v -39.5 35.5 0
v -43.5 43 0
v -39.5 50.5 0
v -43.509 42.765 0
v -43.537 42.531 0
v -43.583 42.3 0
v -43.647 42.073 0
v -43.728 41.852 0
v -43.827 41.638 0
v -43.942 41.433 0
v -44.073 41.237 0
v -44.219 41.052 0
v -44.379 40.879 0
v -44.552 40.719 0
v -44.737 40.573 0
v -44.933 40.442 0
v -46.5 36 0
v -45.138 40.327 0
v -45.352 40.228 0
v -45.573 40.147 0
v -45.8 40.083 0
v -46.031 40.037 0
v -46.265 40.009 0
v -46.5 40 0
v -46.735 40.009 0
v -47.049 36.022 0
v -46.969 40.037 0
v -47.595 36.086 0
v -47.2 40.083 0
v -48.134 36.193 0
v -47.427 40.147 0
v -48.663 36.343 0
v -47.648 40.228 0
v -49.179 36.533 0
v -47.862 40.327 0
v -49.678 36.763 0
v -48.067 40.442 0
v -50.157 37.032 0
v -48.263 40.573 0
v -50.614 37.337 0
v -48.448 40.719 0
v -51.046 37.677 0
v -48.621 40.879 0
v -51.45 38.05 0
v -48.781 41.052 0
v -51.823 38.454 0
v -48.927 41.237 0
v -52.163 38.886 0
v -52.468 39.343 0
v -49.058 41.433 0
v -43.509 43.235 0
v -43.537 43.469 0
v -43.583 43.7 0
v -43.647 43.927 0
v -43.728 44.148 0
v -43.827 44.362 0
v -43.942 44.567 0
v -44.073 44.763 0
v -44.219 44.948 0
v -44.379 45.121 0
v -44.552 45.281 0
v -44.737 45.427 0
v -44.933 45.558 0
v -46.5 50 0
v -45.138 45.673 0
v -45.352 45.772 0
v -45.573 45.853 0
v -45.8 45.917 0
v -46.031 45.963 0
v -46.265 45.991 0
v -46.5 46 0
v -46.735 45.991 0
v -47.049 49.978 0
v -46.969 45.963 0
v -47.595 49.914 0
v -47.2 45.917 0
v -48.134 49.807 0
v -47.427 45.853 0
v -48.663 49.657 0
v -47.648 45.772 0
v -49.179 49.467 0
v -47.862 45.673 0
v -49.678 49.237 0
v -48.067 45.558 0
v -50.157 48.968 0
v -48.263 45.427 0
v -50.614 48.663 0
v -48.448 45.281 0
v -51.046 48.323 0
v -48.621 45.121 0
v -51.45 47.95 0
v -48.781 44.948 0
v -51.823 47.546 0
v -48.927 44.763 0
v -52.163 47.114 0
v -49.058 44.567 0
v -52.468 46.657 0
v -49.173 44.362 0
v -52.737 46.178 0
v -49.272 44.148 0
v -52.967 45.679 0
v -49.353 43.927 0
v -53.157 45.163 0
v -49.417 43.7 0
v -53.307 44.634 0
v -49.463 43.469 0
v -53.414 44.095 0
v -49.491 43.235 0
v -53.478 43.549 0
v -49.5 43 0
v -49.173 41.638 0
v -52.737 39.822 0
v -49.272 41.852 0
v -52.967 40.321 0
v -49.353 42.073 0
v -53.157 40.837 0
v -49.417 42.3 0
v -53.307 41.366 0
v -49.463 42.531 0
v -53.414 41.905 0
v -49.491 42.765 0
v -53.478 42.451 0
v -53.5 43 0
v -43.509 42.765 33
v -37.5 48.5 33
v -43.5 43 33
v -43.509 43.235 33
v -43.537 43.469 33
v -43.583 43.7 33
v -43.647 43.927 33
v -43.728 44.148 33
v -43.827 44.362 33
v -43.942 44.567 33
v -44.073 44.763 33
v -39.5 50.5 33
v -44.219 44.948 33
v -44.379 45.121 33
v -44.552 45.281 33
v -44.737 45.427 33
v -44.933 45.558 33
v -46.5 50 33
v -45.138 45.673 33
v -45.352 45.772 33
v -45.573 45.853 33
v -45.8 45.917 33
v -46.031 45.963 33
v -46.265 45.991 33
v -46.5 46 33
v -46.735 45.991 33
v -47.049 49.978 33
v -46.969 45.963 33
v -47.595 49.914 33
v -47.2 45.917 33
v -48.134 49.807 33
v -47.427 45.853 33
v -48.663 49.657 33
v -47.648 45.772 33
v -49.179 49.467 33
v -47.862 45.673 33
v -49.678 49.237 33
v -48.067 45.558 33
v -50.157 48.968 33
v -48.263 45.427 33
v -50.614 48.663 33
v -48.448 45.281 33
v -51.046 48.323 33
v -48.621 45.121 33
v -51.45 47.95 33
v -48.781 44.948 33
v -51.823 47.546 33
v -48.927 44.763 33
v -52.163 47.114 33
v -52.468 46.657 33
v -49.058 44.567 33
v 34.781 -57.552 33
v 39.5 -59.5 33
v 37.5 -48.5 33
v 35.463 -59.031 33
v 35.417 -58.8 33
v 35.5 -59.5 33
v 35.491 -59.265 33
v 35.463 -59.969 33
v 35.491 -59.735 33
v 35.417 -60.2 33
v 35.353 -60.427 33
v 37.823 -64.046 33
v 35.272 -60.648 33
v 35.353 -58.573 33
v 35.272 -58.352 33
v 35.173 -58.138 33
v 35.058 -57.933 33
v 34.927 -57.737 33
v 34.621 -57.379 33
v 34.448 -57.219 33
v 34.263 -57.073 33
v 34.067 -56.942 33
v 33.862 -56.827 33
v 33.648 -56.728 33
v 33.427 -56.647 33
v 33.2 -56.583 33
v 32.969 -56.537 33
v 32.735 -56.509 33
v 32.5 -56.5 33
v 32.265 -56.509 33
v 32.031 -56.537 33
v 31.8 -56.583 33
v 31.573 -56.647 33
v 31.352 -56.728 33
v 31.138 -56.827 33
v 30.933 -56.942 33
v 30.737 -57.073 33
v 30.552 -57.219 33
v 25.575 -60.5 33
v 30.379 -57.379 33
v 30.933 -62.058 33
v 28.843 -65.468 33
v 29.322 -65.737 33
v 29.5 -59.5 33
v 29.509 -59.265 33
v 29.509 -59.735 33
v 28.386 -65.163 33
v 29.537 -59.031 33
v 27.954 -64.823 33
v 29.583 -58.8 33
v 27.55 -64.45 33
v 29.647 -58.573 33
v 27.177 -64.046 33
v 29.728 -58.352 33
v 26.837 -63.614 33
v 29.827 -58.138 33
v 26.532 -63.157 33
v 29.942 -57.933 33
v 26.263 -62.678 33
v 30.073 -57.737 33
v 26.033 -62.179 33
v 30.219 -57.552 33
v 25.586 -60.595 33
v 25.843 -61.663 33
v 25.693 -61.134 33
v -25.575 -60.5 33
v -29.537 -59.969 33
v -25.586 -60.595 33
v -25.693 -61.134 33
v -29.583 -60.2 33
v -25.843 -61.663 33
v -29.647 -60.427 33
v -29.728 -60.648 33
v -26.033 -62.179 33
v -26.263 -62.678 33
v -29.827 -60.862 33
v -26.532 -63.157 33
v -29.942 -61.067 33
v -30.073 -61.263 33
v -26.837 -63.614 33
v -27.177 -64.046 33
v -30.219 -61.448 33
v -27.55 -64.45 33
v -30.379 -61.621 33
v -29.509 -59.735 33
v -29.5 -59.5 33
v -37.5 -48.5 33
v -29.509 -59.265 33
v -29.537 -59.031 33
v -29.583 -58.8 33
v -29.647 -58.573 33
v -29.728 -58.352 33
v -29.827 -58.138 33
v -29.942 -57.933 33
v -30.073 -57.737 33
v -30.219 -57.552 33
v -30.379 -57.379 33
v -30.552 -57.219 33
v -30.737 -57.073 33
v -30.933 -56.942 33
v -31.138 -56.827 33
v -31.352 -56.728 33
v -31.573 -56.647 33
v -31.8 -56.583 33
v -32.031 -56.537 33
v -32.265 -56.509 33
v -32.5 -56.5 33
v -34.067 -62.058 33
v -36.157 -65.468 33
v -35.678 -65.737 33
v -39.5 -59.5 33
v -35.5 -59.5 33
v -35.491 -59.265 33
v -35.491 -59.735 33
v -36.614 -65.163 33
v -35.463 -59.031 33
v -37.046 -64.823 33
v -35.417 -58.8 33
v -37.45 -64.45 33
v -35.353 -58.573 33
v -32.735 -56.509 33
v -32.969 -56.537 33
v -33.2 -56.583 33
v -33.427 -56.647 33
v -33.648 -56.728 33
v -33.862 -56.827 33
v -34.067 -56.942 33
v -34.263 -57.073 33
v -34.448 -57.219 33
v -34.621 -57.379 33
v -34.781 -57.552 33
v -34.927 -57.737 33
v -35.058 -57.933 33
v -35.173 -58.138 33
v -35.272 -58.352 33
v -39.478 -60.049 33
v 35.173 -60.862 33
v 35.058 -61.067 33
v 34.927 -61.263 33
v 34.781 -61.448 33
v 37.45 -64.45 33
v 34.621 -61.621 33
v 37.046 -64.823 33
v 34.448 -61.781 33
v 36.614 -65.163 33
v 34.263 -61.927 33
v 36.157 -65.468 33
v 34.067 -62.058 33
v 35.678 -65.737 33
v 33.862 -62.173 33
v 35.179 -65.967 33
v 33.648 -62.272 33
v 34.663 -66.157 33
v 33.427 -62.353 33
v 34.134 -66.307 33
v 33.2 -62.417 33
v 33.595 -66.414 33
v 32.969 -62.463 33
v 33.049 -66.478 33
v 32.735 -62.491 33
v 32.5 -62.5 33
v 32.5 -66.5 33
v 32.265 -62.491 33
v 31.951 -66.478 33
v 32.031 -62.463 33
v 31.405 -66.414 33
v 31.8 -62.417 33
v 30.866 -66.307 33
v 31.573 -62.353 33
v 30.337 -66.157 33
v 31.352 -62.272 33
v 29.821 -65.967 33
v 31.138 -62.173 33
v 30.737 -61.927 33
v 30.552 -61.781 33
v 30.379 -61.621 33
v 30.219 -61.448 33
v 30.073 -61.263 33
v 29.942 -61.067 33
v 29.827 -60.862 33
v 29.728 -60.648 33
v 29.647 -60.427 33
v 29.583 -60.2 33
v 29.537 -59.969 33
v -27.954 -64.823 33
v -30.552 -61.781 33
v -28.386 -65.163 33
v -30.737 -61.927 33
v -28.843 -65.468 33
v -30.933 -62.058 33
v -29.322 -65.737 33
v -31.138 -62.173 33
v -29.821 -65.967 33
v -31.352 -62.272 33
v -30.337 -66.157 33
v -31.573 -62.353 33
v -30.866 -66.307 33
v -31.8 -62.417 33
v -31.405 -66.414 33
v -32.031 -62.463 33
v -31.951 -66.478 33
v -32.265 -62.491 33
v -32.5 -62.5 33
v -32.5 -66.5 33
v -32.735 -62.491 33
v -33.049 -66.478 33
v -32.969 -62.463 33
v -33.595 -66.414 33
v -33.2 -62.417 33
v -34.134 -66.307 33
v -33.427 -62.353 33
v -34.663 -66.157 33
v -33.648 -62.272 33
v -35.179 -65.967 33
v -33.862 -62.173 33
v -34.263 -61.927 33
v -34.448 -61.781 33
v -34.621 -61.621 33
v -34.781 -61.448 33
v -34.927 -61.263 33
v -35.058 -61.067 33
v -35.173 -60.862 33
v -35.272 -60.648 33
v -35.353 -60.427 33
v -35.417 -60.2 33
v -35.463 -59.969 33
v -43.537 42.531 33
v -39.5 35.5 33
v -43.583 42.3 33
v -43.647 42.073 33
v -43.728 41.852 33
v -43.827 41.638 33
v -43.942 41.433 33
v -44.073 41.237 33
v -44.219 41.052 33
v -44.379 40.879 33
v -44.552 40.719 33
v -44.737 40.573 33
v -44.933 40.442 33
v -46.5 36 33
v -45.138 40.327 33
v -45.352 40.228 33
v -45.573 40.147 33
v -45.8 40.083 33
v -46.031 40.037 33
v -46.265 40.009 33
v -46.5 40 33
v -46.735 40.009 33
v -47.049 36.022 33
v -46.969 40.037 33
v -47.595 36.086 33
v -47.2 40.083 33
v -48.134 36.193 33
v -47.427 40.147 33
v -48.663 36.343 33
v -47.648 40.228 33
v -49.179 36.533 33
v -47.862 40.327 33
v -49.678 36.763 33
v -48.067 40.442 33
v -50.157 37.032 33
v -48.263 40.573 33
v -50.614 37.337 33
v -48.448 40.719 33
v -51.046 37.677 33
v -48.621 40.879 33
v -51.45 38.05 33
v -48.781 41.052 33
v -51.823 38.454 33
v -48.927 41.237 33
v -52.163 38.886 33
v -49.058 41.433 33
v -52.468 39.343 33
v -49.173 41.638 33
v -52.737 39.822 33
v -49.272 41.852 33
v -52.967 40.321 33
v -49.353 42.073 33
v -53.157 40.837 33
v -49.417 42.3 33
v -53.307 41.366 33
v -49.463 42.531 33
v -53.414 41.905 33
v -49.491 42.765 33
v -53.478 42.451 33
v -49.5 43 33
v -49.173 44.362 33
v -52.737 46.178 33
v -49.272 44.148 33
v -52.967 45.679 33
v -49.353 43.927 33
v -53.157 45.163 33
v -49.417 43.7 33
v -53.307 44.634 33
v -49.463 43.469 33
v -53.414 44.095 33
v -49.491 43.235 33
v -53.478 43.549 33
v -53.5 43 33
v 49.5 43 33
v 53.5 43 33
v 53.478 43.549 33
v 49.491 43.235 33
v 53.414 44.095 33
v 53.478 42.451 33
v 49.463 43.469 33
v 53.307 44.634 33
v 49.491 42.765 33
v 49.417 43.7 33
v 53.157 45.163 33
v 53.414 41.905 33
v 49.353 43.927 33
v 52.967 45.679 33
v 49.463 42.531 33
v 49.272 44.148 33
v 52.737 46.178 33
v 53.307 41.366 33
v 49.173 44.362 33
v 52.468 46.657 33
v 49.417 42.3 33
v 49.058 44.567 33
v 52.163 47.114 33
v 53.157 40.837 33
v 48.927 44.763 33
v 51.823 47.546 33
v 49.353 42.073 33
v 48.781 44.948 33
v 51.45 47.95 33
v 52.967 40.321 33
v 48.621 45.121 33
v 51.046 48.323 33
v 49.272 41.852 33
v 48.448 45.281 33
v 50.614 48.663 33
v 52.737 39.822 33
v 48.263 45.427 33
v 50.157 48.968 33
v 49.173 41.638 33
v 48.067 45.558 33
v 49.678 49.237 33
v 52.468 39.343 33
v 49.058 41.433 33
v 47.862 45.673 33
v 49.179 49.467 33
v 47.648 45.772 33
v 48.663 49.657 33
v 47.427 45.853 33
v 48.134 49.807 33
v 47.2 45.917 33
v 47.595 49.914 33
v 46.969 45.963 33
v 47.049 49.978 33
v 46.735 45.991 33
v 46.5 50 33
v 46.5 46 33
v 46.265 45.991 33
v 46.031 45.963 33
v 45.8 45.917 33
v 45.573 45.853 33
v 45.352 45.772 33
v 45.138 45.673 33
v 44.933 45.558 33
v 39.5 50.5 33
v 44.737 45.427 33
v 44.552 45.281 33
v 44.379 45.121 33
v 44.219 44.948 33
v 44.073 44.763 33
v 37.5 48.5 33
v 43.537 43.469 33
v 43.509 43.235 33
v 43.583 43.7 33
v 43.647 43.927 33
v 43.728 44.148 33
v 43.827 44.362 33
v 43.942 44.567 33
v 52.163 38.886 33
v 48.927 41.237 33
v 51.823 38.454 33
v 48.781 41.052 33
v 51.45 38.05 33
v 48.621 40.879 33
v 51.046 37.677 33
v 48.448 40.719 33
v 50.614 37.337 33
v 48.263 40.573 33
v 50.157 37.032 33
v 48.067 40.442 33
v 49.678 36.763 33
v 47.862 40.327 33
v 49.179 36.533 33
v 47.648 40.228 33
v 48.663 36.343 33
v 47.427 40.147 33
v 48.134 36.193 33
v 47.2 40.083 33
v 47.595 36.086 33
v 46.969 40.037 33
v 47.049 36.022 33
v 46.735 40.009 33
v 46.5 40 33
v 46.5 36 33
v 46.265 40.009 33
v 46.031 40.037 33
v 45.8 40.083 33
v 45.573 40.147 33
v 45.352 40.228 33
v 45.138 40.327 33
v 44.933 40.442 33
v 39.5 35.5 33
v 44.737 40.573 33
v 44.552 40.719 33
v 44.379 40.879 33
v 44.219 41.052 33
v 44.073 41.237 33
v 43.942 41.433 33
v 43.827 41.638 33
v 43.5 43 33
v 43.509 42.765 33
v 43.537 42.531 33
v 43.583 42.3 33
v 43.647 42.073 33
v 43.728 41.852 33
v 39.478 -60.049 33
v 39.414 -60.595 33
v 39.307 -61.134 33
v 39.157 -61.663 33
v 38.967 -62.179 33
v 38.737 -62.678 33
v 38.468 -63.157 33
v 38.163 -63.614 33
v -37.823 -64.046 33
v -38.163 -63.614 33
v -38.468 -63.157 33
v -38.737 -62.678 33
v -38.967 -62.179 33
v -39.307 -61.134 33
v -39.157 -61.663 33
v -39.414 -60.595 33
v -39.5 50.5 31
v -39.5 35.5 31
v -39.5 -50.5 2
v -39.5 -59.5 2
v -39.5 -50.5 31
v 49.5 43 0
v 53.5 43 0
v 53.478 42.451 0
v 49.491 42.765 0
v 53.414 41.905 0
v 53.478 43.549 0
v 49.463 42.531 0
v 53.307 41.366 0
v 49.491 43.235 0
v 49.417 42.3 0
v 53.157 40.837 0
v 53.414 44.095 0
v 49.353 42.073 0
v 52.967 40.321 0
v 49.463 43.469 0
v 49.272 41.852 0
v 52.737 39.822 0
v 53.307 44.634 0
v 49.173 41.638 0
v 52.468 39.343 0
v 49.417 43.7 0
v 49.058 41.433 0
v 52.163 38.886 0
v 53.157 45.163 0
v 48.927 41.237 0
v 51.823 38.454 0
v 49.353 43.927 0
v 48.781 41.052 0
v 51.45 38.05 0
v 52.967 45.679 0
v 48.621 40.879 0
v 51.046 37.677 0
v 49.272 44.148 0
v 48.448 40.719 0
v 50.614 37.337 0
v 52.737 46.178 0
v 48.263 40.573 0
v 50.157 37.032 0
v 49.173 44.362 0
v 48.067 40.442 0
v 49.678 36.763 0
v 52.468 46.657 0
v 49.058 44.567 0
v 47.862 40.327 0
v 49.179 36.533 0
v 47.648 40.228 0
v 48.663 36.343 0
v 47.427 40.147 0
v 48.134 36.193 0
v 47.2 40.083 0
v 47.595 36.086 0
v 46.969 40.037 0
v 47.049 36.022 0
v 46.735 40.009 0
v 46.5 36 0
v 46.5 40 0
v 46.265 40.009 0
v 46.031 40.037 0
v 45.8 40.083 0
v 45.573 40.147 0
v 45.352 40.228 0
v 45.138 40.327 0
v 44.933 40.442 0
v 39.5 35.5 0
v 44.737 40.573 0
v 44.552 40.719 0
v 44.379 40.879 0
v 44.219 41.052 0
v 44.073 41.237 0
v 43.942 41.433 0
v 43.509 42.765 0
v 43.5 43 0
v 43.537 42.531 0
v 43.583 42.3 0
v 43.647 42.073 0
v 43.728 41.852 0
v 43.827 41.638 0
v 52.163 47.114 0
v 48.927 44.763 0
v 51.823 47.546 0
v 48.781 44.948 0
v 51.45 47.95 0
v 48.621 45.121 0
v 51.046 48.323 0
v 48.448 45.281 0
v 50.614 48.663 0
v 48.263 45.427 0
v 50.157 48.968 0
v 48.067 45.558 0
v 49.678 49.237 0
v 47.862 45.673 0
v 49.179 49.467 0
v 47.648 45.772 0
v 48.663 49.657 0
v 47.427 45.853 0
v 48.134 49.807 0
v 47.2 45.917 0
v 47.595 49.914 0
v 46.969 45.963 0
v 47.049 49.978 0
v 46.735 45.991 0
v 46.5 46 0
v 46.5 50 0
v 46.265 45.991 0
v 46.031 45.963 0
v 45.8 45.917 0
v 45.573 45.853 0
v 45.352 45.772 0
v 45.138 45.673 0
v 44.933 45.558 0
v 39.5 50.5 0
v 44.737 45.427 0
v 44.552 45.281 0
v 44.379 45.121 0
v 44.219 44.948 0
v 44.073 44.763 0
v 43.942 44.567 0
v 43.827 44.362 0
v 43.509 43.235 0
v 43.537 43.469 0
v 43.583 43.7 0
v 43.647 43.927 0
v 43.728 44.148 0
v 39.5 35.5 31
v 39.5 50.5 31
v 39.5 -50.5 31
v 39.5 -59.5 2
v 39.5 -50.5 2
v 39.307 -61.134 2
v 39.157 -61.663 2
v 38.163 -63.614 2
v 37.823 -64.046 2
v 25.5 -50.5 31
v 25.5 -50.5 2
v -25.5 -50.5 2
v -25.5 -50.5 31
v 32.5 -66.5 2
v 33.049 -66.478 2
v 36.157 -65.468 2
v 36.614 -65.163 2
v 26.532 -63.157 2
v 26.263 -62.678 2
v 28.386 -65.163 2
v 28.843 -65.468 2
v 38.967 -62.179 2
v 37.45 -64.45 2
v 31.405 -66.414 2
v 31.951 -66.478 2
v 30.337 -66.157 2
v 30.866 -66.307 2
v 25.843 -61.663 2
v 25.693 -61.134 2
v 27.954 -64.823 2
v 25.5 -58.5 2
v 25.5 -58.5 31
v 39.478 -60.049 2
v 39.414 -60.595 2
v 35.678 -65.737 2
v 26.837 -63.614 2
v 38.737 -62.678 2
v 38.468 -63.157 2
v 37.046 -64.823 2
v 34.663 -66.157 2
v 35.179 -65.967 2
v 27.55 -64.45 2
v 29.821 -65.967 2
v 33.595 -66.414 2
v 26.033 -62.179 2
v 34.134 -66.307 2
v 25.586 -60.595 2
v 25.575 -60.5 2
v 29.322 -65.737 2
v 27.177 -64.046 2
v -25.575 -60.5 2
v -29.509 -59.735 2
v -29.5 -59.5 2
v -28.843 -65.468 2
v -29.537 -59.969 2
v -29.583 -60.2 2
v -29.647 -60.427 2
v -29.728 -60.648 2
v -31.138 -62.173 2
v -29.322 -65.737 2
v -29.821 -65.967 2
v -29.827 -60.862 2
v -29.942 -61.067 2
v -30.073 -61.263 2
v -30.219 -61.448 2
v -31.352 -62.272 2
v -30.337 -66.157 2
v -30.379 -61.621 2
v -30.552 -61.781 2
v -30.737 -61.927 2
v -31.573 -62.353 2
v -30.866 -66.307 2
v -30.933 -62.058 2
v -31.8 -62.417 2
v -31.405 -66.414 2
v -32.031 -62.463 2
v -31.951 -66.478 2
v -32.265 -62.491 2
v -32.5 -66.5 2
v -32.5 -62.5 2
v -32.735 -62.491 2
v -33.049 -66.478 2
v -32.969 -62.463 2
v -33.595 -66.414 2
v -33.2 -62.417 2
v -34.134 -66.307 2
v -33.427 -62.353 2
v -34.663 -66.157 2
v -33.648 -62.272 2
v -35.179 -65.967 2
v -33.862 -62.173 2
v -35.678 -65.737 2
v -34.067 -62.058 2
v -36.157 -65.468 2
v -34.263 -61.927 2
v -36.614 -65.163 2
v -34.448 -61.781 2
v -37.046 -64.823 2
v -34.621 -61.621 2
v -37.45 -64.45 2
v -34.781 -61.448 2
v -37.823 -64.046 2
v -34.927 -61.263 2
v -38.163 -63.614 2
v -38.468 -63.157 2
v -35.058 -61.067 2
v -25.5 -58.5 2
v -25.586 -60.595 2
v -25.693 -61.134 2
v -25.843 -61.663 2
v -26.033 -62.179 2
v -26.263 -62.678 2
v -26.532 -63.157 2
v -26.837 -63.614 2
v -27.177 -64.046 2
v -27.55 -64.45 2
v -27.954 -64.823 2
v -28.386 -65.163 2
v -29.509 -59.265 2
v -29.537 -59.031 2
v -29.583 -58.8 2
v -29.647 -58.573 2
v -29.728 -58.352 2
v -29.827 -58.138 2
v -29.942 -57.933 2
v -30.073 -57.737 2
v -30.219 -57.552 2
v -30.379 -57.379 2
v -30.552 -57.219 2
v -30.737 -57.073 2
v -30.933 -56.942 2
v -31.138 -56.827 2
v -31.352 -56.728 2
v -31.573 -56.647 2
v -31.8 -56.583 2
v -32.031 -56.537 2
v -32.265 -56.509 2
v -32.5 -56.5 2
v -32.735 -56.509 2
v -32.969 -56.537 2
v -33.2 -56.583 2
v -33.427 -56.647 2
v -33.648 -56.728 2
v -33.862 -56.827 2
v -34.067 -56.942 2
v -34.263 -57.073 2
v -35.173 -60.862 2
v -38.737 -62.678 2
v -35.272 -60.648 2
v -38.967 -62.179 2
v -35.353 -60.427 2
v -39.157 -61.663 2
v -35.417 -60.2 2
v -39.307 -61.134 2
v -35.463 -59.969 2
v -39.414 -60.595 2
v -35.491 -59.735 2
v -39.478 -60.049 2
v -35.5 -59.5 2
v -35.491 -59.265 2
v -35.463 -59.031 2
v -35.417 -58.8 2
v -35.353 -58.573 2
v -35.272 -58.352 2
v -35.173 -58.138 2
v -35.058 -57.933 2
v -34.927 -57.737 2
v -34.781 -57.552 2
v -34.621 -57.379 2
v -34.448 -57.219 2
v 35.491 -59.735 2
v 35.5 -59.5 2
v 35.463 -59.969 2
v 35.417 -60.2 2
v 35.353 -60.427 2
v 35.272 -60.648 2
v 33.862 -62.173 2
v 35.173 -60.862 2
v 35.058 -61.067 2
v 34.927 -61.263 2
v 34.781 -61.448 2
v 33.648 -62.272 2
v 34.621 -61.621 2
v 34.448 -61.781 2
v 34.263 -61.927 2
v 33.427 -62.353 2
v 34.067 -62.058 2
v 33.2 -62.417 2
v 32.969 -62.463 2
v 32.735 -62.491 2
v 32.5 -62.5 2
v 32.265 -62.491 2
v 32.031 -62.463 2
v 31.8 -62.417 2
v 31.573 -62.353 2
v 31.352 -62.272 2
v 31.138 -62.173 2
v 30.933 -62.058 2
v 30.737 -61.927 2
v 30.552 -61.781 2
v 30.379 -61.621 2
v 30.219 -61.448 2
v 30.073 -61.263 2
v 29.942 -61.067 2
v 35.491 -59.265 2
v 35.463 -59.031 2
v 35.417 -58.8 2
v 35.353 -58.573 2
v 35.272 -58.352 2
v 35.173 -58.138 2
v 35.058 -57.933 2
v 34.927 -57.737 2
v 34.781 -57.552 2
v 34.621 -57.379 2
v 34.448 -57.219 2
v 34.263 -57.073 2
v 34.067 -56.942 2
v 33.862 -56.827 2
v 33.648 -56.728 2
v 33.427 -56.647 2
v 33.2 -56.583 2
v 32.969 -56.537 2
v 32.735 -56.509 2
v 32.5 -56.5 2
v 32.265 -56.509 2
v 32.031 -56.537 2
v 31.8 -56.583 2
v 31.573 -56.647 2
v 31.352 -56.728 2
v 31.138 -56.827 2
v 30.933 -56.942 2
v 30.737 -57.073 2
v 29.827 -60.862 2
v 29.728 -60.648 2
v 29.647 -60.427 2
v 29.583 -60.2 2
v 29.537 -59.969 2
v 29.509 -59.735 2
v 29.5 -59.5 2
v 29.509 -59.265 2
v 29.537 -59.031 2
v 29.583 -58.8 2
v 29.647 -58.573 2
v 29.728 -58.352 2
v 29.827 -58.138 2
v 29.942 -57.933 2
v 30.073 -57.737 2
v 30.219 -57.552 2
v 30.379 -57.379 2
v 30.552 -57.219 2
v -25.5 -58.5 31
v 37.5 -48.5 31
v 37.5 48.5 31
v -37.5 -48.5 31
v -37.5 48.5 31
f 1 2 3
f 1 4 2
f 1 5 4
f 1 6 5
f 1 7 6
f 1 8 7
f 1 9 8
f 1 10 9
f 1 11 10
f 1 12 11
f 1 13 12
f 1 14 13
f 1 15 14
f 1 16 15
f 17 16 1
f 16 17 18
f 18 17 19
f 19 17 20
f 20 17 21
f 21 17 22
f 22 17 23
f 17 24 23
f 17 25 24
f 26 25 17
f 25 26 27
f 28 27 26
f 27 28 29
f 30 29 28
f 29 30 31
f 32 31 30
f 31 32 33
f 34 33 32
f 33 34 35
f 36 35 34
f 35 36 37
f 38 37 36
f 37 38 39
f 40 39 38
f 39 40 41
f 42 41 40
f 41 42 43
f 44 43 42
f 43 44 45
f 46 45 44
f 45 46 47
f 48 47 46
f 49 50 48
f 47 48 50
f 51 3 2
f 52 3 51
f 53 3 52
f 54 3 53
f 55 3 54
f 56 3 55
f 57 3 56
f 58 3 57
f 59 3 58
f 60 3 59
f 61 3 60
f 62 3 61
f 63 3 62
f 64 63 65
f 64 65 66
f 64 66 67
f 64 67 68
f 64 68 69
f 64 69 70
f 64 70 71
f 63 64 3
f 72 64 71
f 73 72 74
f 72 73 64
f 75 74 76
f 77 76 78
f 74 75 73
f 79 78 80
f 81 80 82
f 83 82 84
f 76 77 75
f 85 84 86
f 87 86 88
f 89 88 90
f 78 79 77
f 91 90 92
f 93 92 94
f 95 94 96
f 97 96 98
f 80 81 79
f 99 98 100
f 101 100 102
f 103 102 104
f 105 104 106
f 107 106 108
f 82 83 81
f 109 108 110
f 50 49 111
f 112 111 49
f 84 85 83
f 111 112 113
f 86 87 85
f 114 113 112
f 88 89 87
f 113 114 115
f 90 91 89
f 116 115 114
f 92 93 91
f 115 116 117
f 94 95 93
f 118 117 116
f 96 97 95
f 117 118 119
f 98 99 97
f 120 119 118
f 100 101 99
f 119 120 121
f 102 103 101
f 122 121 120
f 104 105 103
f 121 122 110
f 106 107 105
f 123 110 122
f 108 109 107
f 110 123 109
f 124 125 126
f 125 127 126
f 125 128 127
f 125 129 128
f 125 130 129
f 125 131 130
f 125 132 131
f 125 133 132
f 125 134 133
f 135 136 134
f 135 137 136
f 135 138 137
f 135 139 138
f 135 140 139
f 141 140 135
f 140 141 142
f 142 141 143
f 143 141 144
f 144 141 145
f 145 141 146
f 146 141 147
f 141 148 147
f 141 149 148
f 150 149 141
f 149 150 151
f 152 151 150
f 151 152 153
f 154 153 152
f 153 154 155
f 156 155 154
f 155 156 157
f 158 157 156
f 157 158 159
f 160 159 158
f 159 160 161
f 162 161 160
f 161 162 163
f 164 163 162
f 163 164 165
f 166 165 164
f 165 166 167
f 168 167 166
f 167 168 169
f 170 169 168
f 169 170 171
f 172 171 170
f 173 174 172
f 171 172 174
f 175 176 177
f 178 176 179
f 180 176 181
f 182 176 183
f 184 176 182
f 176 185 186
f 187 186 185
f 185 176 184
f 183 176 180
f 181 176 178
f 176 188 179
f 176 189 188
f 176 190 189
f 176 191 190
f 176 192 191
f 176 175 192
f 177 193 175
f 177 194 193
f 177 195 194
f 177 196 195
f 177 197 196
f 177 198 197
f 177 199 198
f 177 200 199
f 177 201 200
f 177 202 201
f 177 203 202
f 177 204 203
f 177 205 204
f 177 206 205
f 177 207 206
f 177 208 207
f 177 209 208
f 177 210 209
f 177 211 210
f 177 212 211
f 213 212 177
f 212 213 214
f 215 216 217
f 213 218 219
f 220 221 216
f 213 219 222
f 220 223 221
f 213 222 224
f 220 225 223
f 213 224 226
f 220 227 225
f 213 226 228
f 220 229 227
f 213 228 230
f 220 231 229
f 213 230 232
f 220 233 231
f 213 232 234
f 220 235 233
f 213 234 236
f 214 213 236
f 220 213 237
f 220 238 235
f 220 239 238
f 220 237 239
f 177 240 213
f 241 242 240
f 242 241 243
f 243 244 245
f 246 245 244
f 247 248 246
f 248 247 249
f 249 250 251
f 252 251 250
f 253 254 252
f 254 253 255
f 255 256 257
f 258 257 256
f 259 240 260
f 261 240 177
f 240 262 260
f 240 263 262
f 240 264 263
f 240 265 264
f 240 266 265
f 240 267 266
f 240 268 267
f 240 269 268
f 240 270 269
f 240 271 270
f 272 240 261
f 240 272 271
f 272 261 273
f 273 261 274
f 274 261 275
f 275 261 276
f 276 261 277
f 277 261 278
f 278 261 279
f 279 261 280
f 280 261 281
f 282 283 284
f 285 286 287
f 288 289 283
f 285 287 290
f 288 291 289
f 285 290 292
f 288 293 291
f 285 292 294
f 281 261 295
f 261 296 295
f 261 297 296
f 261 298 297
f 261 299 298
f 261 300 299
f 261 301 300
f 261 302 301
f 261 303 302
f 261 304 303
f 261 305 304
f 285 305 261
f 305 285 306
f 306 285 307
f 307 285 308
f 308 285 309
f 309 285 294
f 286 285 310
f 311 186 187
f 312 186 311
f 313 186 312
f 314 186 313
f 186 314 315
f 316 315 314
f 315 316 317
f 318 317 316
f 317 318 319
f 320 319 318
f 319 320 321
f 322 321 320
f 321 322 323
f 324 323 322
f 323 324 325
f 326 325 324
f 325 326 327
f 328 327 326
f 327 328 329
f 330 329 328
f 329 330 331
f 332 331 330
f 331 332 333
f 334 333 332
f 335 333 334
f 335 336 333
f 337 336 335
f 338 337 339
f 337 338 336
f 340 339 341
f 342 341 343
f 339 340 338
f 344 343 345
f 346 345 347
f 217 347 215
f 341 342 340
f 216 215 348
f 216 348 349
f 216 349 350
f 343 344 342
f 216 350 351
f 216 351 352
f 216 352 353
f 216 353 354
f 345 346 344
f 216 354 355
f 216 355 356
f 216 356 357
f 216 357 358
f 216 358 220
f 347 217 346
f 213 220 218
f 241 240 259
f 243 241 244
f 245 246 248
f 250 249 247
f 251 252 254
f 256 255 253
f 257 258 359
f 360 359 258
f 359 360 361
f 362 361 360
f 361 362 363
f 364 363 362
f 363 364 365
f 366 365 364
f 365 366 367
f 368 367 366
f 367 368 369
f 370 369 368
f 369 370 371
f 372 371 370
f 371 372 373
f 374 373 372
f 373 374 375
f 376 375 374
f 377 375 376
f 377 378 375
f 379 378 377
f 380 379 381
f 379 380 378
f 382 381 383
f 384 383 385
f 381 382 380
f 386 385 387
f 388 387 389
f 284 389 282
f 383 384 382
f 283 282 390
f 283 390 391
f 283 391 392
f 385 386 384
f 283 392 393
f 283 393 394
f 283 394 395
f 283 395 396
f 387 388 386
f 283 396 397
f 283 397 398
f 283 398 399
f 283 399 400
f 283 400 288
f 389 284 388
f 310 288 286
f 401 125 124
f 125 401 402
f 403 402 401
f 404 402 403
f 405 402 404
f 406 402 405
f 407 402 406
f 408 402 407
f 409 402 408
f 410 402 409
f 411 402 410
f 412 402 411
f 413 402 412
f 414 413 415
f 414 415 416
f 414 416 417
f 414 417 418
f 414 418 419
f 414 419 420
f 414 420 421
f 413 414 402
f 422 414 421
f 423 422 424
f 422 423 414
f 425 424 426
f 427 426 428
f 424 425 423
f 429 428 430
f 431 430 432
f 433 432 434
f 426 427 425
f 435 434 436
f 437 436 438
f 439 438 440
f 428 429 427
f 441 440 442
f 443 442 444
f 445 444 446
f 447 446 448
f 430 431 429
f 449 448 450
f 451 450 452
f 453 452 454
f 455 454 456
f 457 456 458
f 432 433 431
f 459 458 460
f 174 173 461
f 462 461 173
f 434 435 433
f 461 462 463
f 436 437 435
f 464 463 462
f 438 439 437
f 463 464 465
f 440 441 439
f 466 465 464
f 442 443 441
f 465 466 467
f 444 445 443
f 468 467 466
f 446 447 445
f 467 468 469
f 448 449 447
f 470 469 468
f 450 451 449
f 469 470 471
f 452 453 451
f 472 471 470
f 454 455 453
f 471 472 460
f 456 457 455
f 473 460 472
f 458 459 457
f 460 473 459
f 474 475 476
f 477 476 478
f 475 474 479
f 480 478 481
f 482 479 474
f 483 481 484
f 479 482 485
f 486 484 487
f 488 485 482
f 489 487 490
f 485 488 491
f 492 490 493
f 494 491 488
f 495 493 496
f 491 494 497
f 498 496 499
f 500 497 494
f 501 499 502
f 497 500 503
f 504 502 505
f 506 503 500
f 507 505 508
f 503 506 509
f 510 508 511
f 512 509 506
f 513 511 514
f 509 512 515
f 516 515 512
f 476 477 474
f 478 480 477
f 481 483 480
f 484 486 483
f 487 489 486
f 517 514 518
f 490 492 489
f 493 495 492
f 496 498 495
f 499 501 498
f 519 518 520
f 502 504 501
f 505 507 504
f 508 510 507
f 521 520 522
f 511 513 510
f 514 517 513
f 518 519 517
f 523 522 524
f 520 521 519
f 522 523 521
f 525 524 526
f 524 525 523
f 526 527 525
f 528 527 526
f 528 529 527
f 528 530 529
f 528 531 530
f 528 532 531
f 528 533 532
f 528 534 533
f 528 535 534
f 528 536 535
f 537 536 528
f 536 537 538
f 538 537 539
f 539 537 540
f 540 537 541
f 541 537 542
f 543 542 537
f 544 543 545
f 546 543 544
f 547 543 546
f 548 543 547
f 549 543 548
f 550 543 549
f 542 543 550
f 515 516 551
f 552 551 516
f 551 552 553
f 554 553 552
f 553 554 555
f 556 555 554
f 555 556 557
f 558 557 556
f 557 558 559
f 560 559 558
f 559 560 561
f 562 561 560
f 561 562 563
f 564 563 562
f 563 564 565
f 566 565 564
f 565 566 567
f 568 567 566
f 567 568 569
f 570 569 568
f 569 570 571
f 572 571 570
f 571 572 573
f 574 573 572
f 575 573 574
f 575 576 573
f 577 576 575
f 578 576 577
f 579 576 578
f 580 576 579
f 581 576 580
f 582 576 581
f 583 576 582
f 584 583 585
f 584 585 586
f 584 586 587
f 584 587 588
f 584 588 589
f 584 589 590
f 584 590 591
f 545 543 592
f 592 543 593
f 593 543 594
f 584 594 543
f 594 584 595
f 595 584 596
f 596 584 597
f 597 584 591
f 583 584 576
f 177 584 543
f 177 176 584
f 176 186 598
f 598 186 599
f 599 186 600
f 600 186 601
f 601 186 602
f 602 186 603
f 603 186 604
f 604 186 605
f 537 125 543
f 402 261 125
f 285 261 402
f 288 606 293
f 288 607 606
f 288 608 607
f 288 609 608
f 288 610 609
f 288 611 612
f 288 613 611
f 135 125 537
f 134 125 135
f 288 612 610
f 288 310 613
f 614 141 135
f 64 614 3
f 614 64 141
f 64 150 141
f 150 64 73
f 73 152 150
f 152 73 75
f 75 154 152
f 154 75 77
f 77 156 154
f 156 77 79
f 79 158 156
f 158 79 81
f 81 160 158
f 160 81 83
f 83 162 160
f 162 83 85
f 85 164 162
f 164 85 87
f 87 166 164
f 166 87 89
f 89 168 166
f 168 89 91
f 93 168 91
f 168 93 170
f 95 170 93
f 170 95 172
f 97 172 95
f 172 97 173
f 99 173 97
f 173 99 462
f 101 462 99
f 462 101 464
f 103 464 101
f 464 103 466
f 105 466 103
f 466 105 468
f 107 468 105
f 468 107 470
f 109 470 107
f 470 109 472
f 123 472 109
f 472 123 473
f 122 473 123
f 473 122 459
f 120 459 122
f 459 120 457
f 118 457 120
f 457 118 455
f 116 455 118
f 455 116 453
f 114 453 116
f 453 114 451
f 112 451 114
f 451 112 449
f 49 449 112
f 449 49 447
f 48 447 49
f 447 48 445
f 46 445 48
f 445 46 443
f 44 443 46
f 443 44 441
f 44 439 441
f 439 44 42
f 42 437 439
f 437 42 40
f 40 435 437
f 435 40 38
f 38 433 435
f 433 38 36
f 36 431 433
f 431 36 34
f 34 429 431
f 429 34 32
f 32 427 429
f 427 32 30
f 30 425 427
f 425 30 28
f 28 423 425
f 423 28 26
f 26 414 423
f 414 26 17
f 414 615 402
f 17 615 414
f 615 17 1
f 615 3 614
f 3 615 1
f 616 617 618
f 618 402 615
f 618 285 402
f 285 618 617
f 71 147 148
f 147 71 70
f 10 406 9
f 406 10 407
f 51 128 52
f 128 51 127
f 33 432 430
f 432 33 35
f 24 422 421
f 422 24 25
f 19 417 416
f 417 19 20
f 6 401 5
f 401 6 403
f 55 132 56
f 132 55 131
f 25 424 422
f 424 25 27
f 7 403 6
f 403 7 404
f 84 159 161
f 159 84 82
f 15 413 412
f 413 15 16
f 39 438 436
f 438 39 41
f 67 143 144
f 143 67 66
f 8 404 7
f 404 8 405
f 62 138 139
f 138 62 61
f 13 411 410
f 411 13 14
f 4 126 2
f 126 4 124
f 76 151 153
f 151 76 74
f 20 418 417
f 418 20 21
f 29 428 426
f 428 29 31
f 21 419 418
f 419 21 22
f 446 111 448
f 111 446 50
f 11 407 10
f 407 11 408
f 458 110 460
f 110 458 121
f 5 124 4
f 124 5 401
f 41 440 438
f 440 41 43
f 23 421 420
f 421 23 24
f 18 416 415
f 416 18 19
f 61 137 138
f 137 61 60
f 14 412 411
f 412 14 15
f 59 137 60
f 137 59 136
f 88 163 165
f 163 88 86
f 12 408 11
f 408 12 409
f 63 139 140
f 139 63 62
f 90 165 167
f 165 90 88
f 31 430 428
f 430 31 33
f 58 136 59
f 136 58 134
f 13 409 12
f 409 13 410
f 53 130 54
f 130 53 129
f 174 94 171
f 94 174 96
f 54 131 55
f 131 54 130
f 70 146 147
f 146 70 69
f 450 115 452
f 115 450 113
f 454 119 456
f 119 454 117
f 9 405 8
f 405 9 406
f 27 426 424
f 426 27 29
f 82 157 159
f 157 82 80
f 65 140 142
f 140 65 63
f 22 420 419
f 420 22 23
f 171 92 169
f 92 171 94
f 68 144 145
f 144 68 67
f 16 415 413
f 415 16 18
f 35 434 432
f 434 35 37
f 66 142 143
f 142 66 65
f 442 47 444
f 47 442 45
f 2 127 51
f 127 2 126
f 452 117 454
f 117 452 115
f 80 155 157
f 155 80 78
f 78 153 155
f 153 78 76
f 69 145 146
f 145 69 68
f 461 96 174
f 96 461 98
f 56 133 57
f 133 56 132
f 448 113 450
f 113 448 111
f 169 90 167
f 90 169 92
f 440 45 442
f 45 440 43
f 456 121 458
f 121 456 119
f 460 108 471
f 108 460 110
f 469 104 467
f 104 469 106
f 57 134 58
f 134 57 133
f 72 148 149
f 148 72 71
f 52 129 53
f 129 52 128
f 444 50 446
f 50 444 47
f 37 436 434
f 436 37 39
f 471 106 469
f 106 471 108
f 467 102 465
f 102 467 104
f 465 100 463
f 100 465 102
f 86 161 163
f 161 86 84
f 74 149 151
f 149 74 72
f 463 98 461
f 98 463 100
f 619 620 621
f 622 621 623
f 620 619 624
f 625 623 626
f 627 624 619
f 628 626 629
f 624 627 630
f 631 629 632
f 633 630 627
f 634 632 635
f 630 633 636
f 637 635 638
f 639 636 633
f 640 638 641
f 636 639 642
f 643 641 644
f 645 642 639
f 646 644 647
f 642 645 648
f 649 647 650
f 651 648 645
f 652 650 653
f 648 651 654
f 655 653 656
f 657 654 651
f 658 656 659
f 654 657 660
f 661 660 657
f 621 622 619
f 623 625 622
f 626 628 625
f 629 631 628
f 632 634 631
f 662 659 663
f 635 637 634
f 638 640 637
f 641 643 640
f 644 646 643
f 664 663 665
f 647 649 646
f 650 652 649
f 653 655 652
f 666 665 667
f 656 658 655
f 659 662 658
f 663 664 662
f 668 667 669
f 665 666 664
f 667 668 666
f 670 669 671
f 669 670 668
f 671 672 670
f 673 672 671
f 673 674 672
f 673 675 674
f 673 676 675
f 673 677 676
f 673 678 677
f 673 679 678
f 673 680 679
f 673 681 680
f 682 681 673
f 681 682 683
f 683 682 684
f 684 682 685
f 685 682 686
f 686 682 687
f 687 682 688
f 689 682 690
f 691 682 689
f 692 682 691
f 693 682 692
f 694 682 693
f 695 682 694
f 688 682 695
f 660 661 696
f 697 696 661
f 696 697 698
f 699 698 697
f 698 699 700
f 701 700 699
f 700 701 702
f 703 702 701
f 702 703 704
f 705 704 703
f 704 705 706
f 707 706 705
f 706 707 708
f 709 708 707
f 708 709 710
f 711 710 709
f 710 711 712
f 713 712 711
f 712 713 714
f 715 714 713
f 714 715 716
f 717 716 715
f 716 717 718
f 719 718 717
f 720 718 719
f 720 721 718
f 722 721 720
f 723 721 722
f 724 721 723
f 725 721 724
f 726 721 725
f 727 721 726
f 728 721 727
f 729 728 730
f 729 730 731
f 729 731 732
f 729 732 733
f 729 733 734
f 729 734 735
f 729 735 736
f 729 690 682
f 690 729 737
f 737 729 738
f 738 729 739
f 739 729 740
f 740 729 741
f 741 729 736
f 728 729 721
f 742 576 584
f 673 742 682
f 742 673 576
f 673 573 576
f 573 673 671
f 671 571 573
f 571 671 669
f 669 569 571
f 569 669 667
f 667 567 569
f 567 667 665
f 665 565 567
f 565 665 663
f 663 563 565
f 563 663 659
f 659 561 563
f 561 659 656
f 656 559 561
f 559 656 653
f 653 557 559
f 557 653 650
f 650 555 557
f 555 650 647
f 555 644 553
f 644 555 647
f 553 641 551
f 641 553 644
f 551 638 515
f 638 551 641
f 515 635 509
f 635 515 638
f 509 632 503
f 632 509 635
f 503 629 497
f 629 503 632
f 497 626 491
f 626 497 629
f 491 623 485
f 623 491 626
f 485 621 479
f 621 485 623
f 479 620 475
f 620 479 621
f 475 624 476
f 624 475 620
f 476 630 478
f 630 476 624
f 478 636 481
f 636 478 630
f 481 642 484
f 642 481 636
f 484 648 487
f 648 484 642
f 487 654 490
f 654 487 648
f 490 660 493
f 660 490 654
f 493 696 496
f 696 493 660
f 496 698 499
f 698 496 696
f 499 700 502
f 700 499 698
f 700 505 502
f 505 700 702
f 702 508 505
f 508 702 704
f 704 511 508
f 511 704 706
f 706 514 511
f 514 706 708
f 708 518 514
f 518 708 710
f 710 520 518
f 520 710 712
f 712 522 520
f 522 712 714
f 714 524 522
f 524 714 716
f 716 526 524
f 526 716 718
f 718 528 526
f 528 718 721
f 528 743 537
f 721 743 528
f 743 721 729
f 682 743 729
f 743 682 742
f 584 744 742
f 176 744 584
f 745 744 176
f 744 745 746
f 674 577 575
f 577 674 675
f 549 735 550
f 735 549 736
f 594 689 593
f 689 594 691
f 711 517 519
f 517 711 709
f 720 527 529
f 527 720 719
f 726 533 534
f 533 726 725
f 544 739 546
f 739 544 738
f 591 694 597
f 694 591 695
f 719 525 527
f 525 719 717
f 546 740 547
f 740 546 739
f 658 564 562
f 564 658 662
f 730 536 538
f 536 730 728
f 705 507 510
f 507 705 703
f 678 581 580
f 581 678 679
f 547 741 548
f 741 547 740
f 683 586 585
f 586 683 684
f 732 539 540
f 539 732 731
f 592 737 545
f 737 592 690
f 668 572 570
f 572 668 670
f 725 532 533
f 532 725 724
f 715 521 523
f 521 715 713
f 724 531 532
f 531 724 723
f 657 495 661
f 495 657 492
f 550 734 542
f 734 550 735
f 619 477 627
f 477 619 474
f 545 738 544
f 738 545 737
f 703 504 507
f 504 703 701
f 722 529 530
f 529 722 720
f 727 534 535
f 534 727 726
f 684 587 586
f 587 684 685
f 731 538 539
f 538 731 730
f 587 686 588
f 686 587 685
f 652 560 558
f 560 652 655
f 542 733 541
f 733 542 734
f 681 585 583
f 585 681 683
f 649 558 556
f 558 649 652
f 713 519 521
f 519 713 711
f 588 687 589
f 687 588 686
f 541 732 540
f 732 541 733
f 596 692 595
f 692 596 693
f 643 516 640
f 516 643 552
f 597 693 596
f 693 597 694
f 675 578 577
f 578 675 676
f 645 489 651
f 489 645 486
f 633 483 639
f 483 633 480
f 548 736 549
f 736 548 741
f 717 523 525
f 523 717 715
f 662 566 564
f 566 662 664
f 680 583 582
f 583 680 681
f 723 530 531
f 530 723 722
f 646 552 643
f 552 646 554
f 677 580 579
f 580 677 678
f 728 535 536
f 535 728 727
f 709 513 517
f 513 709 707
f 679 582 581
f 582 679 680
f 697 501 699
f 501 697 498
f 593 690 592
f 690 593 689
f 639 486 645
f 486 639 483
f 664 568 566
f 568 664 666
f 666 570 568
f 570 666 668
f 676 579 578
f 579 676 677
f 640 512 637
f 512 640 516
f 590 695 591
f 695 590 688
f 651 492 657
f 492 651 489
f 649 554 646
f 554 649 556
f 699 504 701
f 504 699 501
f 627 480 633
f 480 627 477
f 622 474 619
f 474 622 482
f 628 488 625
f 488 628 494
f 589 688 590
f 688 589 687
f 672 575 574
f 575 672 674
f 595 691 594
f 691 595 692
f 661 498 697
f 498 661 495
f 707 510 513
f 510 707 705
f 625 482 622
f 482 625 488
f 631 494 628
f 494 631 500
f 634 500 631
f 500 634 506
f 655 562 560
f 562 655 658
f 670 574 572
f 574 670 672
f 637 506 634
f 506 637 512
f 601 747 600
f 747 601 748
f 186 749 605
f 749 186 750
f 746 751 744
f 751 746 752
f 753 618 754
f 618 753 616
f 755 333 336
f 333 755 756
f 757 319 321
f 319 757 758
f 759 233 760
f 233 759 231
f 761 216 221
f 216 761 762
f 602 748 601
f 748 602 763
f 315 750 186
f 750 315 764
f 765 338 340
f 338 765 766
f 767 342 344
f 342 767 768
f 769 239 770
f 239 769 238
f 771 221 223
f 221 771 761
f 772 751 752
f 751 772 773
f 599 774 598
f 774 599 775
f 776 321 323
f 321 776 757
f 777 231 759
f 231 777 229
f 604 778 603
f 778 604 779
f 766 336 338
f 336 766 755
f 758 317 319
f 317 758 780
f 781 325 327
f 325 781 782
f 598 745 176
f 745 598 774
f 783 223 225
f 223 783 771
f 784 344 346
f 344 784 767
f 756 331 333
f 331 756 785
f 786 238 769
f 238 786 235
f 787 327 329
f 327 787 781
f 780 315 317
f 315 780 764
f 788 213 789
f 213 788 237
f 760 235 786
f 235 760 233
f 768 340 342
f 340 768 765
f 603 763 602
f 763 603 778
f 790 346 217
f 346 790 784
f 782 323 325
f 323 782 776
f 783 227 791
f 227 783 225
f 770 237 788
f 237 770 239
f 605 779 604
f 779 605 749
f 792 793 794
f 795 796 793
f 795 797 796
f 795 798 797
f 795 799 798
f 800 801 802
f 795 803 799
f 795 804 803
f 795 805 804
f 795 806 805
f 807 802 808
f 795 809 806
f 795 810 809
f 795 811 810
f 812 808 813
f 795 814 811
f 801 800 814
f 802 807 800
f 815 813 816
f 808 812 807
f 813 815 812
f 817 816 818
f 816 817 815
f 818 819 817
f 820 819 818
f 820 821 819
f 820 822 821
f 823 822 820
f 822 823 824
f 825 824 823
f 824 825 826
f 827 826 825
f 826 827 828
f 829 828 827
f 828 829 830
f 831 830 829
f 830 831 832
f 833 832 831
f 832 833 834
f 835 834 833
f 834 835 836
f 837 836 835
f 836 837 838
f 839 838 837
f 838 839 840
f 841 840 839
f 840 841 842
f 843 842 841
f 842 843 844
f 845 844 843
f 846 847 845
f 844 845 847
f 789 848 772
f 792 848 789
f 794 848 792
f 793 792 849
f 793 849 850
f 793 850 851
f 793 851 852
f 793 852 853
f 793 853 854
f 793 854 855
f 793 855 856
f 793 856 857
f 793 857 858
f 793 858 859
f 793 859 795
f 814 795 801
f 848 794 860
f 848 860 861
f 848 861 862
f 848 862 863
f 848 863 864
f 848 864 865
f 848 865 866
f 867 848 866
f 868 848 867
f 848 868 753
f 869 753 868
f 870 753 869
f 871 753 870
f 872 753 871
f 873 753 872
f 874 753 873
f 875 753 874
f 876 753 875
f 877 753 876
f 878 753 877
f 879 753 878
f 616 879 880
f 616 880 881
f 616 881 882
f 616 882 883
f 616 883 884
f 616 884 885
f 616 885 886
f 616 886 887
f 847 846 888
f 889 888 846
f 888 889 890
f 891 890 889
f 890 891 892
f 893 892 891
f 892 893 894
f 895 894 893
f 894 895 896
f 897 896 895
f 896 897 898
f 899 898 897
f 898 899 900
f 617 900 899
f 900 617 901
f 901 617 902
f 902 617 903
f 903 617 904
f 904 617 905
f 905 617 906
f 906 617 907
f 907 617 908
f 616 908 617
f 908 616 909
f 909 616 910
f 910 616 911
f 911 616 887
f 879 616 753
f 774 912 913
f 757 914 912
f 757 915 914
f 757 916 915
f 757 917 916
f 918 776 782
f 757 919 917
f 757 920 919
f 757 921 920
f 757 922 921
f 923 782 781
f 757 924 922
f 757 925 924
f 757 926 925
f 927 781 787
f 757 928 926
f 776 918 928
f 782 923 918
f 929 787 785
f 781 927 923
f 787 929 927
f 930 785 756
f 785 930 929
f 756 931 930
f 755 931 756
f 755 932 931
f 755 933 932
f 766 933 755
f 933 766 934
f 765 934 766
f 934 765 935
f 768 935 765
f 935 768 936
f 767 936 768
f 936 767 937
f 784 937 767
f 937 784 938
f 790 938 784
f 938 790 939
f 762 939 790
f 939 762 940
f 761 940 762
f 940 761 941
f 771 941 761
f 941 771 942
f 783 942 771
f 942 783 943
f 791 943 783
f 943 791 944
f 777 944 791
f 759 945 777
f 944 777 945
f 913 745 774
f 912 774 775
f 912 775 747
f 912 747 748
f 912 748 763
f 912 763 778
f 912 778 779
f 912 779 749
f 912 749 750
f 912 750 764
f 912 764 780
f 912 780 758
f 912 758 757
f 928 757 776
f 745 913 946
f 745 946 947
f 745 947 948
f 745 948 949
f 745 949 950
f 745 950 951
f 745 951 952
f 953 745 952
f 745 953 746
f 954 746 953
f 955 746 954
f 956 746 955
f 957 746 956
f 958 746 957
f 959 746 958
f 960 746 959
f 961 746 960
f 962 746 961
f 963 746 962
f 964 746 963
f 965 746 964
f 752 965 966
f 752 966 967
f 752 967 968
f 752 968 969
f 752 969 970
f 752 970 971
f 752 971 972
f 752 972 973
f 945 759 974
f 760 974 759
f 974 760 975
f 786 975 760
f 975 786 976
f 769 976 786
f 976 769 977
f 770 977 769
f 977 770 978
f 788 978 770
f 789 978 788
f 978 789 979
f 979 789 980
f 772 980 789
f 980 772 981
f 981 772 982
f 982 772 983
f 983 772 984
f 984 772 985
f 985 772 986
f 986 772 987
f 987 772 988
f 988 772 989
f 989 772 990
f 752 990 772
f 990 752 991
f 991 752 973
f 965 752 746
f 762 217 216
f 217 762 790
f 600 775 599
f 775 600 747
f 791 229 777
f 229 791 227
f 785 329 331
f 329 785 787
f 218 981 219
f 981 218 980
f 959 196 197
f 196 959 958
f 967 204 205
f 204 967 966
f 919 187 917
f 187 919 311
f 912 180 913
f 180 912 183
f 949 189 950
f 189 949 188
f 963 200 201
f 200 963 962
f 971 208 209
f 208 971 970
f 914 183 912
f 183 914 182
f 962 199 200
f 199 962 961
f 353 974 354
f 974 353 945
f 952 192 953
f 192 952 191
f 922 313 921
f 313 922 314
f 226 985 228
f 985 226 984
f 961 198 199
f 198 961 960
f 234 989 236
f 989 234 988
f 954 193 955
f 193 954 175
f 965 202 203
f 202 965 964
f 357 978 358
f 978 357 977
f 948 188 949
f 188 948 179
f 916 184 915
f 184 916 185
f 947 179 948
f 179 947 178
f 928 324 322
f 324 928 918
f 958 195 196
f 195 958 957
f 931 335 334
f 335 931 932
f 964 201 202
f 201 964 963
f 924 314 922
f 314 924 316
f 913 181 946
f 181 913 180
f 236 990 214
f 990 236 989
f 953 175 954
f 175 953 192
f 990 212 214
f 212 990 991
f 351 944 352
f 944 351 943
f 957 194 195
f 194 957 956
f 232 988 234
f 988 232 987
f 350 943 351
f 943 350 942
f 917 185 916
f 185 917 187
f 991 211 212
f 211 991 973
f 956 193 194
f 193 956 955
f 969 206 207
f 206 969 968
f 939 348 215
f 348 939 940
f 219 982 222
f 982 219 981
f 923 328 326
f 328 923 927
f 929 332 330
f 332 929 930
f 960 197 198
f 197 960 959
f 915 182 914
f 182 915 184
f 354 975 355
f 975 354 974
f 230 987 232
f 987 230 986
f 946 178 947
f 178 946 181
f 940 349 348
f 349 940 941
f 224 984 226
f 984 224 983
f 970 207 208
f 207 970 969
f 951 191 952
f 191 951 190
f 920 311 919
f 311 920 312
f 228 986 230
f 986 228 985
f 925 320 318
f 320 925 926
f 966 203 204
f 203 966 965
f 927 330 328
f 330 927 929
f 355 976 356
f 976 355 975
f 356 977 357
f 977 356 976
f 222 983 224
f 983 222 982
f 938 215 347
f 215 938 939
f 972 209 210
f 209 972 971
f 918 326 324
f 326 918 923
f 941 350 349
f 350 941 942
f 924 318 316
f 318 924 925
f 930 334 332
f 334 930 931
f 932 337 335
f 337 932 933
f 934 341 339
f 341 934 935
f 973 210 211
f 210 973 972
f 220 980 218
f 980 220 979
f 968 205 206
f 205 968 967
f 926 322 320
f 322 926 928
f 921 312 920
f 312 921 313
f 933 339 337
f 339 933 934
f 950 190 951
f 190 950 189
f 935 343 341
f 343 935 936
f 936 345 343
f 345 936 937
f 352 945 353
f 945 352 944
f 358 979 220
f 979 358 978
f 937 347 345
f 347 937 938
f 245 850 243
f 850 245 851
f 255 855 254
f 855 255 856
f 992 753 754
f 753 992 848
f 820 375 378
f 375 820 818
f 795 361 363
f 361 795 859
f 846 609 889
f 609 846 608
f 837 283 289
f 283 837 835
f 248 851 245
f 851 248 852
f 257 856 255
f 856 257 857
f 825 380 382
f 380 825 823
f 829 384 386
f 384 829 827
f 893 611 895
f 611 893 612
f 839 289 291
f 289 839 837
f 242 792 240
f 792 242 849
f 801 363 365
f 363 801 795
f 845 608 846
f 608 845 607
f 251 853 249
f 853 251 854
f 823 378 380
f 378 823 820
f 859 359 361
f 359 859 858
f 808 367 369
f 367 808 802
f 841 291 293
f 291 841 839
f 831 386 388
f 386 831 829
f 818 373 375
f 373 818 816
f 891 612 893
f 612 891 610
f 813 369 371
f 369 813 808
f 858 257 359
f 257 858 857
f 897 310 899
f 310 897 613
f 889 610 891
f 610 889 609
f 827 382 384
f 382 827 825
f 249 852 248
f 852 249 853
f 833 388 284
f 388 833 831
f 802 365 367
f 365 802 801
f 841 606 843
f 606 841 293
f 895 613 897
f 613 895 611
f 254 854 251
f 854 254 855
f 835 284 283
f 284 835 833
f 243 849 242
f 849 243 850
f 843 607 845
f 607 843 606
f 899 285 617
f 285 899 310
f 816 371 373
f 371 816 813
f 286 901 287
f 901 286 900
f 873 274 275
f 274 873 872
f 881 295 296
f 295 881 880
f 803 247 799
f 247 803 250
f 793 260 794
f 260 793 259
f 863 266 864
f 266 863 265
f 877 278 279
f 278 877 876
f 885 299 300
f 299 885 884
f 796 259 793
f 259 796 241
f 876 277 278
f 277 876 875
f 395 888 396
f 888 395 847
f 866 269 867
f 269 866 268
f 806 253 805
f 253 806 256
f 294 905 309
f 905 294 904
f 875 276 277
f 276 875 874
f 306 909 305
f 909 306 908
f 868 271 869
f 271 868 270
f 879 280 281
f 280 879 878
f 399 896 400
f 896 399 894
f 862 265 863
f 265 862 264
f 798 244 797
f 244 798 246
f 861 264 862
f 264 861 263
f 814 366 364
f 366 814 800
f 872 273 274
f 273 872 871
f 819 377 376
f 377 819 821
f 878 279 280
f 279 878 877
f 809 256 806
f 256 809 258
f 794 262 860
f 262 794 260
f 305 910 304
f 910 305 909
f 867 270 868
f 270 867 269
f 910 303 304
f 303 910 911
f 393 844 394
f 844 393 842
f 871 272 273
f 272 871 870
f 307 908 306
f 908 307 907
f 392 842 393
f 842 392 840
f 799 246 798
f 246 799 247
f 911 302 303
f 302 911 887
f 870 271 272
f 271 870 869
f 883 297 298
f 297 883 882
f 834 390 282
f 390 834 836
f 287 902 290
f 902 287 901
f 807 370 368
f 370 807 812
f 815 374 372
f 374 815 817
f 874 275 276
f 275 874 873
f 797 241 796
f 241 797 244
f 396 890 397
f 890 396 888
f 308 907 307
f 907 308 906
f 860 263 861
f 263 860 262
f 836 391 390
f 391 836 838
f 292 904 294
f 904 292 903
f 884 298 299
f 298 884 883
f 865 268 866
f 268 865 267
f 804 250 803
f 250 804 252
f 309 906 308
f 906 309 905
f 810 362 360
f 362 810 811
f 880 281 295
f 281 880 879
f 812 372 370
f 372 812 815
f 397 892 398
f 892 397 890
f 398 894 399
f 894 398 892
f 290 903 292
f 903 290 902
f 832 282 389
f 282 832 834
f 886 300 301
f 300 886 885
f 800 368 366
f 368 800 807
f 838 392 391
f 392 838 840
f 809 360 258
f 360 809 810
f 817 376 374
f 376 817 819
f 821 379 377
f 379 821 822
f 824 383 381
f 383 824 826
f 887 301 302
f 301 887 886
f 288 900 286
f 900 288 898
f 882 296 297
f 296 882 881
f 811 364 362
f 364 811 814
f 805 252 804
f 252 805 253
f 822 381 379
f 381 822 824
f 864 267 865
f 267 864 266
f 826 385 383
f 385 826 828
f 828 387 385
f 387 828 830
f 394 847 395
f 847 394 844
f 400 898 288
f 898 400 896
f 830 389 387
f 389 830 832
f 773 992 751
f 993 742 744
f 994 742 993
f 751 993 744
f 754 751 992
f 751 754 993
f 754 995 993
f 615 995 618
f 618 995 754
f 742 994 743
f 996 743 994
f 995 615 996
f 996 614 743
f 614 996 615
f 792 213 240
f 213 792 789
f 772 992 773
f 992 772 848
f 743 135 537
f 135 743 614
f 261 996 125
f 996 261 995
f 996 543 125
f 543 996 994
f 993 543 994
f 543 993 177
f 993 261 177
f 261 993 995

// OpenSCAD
module ShifterThing() {
  translate([-8, 3, -1])
    linear_extrude(4)
    rotate([0, 0, -17])
    rotate([0, 180, 0])
    import("path413.svg", center=true, dpi=94.5);
}

TOP_PLATE_Y = 101;

module Foo(width) {
  difference() {
    linear_extrude(2)
      square([width, TOP_PLATE_Y], center=true);

    translate([0, 0, -1])
      linear_extrude(4)
      square([width - 4, TOP_PLATE_Y - 4], center=true);
    //ShifterThing();
  }
}

POST_DIAMETER = 6;
POST_OUTER_DIAMETER = 14;
REAR_TAB_LENGTH = 16;
MIN_WALL_THICKNESS = 2;

module RearPost(height) {
  $fn = 80;
  diameter = POST_DIAMETER;

  outer_diameter = POST_OUTER_DIAMETER;

  length = (outer_diameter / 2) + (REAR_TAB_LENGTH - outer_diameter);
  echo(length);

  difference() {
    linear_extrude(height)
      union() {
        circle(d = outer_diameter);
        translate([-(outer_diameter / 2), -length])
          square([outer_diameter, length]);
      }

    translate([0, 0, -1])
    linear_extrude(height + 2)
      circle(d = diameter);
  }
}

BOX_X = 79;

module FrontPosts(height) {
  x = (BOX_X / 2) + 7;
  translate([-x, 0, 0])
    rotate([0, 0, 90])
    FrontPost(height);

  translate([x, 0, 0])
    rotate([0, 0, -90])
    FrontPost(height);
}

module FrontPost(height) {
  $fn = 80;
  diameter = POST_DIAMETER;

  outer_diameter = POST_OUTER_DIAMETER;

  length = (outer_diameter / 2) + (16 - outer_diameter);

  difference() {
    linear_extrude(height)
      union() {
        circle(d = outer_diameter);
        translate([-(15 / 2), -7])
          polygon([[0, 0], [15, 0], [14.5, 7], [0.5, 7]]);
      }

    translate([0, 0, -1])
    linear_extrude(height + 2)
      circle(d = diameter);
  }

}

module RearWall(height) {
  rear_post_center_x = (59 / 2) + (POST_DIAMETER / 2);

  for (i = [-1, 1]) {
    translate([i * rear_post_center_x, 0, 0])
      RearPost(height);
  }

  top_fill_y = REAR_TAB_LENGTH - (POST_OUTER_DIAMETER / 2);
  // Top plate between tabs
  translate([0, -(top_fill_y / 2), height - MIN_WALL_THICKNESS])
    linear_extrude(MIN_WALL_THICKNESS)
    // Just adding +2 to make it slightly wider so everything is connected nicely
    square([((rear_post_center_x * 2) - POST_OUTER_DIAMETER) + 2, top_fill_y], center=true);

  linear_extrude(height)
    square([(rear_post_center_x * 2) - POST_DIAMETER, 2], center=true);
}

REAR_POST_Z = 31;

translate([0, (TOP_PLATE_Y / 2) - (15 / 2), 0])
  FrontPosts(REAR_POST_Z + 2); // front are ~2mm lower

translate([0, 0, 2]) {
translate([0, -((TOP_PLATE_Y / 2) + 9), 0])
rotate([0, 0, 180])
  RearWall(REAR_POST_Z);
translate([0, 0, REAR_POST_Z - 2])
  Foo(79);
}
